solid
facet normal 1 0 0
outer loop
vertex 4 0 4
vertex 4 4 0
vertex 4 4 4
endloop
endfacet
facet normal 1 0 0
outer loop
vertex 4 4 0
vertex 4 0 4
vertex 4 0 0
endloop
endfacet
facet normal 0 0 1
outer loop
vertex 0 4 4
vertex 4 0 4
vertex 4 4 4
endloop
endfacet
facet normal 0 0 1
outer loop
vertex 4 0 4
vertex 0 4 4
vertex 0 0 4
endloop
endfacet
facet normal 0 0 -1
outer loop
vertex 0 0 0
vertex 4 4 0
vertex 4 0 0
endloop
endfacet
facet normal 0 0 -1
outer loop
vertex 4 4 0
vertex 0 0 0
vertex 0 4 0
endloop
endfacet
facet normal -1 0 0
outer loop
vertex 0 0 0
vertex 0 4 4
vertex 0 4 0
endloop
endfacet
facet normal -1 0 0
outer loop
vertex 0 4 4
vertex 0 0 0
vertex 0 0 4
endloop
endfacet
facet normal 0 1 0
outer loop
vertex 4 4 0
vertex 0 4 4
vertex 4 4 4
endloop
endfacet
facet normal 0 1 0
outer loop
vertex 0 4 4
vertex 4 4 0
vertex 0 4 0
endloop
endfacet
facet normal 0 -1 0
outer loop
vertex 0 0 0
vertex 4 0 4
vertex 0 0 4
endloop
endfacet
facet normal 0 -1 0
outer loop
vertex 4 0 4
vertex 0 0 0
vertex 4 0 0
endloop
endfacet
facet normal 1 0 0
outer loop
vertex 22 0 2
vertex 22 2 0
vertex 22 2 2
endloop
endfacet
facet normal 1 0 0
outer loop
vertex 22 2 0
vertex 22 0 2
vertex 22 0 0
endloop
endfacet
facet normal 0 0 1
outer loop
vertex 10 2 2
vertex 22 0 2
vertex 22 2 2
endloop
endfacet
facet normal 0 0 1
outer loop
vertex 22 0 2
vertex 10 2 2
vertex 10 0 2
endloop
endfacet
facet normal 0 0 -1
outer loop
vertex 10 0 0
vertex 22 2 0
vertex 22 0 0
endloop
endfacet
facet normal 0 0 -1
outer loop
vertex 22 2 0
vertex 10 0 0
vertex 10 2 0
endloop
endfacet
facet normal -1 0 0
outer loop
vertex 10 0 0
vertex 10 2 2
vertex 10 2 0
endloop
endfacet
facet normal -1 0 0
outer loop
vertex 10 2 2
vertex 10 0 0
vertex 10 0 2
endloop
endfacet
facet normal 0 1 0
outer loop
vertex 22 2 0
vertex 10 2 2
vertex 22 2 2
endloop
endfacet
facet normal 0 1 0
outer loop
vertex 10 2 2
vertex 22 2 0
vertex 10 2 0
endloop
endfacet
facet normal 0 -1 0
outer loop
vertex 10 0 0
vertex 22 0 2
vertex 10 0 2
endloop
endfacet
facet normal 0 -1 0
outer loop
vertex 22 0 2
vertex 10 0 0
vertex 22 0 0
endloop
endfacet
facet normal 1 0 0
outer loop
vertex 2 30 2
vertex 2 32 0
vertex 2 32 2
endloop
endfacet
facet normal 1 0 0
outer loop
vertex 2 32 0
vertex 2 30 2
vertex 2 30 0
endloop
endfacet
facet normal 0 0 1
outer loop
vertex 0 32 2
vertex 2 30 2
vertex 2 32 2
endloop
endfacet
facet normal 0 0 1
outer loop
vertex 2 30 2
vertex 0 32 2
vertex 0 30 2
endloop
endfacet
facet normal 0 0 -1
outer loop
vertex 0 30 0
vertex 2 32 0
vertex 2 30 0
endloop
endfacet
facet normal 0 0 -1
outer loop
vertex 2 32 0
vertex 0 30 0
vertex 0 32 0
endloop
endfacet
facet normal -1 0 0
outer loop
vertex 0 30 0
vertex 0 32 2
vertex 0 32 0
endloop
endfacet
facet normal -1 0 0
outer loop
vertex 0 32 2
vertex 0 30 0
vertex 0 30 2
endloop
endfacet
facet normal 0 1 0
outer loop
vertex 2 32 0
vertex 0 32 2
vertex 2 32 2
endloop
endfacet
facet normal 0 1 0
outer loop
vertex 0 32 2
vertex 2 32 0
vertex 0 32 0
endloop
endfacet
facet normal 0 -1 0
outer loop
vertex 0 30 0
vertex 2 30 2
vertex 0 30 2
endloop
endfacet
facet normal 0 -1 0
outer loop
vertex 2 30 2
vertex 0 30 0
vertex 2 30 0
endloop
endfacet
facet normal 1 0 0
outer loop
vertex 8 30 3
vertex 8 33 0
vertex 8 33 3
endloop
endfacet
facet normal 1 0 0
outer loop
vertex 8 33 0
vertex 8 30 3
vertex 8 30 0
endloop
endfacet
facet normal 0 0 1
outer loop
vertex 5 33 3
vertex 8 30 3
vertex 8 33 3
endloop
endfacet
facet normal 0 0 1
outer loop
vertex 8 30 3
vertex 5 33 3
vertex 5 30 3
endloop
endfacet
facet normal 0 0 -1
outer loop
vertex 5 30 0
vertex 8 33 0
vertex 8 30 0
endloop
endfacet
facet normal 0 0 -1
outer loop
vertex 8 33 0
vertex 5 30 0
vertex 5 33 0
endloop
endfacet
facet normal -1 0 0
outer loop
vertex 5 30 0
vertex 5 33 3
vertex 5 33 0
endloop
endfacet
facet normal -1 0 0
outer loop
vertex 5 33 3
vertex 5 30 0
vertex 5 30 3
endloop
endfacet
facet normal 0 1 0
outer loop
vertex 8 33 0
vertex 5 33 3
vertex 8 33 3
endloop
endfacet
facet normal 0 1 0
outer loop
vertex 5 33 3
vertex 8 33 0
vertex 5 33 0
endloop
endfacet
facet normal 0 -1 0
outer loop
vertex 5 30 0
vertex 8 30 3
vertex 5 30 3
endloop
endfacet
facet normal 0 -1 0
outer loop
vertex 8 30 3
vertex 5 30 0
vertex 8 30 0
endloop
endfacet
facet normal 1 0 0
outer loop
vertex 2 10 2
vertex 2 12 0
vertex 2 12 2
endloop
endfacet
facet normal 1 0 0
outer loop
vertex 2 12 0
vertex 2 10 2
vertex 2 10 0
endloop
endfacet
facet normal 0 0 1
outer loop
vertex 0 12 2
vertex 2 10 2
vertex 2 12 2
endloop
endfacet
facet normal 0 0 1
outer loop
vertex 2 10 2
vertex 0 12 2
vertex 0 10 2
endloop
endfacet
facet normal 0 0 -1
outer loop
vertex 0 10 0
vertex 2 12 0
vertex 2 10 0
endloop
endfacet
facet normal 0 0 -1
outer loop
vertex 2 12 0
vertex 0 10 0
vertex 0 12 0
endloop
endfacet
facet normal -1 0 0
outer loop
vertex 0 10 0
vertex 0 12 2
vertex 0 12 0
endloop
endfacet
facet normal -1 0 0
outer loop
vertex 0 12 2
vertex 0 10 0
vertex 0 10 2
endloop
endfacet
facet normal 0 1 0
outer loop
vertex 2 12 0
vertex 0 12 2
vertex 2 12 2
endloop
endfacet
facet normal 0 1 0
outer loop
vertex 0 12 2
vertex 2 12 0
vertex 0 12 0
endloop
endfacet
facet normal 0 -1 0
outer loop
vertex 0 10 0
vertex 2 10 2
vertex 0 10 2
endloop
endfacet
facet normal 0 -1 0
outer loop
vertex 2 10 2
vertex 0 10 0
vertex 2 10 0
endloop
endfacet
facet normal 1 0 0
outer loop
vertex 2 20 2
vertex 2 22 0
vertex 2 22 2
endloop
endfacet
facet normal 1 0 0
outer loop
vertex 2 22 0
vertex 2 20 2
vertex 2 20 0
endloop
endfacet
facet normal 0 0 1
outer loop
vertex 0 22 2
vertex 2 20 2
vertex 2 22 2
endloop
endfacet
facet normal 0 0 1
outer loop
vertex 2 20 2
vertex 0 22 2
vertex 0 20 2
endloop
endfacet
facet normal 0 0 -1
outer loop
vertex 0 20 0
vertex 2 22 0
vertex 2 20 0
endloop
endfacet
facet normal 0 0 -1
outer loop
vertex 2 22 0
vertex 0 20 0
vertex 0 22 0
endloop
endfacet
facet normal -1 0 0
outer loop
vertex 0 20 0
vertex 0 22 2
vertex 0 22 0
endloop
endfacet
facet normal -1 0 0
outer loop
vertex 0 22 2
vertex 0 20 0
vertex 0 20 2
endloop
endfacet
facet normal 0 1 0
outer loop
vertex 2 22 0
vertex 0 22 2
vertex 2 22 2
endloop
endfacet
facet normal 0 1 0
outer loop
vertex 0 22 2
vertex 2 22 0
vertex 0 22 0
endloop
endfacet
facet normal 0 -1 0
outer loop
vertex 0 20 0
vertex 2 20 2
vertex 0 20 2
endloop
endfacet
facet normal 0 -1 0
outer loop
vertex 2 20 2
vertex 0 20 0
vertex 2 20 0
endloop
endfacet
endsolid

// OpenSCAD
// The retained deprecated 2021.01 forms, driving real geometry.
//
// `assign()` is not `let()`: every right-hand side is evaluated in the
// enclosing scope and the bindings take effect together, so `t` below is the
// *outer* s (3) plus 9 = 12, not 13.
s = 3;
assign(s = 4, t = s + 9) { cube(s); translate([10,0,0]) cube([t,2,2]); }

// Bare `child()` is the first child alone, where bare `children()` is all of
// them; `child(i)` selects one.
module first_only() { child(); }
module second_one() { child(1); }
module all_of_them() { children(); }
translate([0,10,0]) first_only() { cube(2); cube(9); }
translate([0,20,0]) second_one() { cube(9); cube(2); }
translate([0,30,0]) all_of_them() { cube(2); translate([5,0,0]) cube(3); }
